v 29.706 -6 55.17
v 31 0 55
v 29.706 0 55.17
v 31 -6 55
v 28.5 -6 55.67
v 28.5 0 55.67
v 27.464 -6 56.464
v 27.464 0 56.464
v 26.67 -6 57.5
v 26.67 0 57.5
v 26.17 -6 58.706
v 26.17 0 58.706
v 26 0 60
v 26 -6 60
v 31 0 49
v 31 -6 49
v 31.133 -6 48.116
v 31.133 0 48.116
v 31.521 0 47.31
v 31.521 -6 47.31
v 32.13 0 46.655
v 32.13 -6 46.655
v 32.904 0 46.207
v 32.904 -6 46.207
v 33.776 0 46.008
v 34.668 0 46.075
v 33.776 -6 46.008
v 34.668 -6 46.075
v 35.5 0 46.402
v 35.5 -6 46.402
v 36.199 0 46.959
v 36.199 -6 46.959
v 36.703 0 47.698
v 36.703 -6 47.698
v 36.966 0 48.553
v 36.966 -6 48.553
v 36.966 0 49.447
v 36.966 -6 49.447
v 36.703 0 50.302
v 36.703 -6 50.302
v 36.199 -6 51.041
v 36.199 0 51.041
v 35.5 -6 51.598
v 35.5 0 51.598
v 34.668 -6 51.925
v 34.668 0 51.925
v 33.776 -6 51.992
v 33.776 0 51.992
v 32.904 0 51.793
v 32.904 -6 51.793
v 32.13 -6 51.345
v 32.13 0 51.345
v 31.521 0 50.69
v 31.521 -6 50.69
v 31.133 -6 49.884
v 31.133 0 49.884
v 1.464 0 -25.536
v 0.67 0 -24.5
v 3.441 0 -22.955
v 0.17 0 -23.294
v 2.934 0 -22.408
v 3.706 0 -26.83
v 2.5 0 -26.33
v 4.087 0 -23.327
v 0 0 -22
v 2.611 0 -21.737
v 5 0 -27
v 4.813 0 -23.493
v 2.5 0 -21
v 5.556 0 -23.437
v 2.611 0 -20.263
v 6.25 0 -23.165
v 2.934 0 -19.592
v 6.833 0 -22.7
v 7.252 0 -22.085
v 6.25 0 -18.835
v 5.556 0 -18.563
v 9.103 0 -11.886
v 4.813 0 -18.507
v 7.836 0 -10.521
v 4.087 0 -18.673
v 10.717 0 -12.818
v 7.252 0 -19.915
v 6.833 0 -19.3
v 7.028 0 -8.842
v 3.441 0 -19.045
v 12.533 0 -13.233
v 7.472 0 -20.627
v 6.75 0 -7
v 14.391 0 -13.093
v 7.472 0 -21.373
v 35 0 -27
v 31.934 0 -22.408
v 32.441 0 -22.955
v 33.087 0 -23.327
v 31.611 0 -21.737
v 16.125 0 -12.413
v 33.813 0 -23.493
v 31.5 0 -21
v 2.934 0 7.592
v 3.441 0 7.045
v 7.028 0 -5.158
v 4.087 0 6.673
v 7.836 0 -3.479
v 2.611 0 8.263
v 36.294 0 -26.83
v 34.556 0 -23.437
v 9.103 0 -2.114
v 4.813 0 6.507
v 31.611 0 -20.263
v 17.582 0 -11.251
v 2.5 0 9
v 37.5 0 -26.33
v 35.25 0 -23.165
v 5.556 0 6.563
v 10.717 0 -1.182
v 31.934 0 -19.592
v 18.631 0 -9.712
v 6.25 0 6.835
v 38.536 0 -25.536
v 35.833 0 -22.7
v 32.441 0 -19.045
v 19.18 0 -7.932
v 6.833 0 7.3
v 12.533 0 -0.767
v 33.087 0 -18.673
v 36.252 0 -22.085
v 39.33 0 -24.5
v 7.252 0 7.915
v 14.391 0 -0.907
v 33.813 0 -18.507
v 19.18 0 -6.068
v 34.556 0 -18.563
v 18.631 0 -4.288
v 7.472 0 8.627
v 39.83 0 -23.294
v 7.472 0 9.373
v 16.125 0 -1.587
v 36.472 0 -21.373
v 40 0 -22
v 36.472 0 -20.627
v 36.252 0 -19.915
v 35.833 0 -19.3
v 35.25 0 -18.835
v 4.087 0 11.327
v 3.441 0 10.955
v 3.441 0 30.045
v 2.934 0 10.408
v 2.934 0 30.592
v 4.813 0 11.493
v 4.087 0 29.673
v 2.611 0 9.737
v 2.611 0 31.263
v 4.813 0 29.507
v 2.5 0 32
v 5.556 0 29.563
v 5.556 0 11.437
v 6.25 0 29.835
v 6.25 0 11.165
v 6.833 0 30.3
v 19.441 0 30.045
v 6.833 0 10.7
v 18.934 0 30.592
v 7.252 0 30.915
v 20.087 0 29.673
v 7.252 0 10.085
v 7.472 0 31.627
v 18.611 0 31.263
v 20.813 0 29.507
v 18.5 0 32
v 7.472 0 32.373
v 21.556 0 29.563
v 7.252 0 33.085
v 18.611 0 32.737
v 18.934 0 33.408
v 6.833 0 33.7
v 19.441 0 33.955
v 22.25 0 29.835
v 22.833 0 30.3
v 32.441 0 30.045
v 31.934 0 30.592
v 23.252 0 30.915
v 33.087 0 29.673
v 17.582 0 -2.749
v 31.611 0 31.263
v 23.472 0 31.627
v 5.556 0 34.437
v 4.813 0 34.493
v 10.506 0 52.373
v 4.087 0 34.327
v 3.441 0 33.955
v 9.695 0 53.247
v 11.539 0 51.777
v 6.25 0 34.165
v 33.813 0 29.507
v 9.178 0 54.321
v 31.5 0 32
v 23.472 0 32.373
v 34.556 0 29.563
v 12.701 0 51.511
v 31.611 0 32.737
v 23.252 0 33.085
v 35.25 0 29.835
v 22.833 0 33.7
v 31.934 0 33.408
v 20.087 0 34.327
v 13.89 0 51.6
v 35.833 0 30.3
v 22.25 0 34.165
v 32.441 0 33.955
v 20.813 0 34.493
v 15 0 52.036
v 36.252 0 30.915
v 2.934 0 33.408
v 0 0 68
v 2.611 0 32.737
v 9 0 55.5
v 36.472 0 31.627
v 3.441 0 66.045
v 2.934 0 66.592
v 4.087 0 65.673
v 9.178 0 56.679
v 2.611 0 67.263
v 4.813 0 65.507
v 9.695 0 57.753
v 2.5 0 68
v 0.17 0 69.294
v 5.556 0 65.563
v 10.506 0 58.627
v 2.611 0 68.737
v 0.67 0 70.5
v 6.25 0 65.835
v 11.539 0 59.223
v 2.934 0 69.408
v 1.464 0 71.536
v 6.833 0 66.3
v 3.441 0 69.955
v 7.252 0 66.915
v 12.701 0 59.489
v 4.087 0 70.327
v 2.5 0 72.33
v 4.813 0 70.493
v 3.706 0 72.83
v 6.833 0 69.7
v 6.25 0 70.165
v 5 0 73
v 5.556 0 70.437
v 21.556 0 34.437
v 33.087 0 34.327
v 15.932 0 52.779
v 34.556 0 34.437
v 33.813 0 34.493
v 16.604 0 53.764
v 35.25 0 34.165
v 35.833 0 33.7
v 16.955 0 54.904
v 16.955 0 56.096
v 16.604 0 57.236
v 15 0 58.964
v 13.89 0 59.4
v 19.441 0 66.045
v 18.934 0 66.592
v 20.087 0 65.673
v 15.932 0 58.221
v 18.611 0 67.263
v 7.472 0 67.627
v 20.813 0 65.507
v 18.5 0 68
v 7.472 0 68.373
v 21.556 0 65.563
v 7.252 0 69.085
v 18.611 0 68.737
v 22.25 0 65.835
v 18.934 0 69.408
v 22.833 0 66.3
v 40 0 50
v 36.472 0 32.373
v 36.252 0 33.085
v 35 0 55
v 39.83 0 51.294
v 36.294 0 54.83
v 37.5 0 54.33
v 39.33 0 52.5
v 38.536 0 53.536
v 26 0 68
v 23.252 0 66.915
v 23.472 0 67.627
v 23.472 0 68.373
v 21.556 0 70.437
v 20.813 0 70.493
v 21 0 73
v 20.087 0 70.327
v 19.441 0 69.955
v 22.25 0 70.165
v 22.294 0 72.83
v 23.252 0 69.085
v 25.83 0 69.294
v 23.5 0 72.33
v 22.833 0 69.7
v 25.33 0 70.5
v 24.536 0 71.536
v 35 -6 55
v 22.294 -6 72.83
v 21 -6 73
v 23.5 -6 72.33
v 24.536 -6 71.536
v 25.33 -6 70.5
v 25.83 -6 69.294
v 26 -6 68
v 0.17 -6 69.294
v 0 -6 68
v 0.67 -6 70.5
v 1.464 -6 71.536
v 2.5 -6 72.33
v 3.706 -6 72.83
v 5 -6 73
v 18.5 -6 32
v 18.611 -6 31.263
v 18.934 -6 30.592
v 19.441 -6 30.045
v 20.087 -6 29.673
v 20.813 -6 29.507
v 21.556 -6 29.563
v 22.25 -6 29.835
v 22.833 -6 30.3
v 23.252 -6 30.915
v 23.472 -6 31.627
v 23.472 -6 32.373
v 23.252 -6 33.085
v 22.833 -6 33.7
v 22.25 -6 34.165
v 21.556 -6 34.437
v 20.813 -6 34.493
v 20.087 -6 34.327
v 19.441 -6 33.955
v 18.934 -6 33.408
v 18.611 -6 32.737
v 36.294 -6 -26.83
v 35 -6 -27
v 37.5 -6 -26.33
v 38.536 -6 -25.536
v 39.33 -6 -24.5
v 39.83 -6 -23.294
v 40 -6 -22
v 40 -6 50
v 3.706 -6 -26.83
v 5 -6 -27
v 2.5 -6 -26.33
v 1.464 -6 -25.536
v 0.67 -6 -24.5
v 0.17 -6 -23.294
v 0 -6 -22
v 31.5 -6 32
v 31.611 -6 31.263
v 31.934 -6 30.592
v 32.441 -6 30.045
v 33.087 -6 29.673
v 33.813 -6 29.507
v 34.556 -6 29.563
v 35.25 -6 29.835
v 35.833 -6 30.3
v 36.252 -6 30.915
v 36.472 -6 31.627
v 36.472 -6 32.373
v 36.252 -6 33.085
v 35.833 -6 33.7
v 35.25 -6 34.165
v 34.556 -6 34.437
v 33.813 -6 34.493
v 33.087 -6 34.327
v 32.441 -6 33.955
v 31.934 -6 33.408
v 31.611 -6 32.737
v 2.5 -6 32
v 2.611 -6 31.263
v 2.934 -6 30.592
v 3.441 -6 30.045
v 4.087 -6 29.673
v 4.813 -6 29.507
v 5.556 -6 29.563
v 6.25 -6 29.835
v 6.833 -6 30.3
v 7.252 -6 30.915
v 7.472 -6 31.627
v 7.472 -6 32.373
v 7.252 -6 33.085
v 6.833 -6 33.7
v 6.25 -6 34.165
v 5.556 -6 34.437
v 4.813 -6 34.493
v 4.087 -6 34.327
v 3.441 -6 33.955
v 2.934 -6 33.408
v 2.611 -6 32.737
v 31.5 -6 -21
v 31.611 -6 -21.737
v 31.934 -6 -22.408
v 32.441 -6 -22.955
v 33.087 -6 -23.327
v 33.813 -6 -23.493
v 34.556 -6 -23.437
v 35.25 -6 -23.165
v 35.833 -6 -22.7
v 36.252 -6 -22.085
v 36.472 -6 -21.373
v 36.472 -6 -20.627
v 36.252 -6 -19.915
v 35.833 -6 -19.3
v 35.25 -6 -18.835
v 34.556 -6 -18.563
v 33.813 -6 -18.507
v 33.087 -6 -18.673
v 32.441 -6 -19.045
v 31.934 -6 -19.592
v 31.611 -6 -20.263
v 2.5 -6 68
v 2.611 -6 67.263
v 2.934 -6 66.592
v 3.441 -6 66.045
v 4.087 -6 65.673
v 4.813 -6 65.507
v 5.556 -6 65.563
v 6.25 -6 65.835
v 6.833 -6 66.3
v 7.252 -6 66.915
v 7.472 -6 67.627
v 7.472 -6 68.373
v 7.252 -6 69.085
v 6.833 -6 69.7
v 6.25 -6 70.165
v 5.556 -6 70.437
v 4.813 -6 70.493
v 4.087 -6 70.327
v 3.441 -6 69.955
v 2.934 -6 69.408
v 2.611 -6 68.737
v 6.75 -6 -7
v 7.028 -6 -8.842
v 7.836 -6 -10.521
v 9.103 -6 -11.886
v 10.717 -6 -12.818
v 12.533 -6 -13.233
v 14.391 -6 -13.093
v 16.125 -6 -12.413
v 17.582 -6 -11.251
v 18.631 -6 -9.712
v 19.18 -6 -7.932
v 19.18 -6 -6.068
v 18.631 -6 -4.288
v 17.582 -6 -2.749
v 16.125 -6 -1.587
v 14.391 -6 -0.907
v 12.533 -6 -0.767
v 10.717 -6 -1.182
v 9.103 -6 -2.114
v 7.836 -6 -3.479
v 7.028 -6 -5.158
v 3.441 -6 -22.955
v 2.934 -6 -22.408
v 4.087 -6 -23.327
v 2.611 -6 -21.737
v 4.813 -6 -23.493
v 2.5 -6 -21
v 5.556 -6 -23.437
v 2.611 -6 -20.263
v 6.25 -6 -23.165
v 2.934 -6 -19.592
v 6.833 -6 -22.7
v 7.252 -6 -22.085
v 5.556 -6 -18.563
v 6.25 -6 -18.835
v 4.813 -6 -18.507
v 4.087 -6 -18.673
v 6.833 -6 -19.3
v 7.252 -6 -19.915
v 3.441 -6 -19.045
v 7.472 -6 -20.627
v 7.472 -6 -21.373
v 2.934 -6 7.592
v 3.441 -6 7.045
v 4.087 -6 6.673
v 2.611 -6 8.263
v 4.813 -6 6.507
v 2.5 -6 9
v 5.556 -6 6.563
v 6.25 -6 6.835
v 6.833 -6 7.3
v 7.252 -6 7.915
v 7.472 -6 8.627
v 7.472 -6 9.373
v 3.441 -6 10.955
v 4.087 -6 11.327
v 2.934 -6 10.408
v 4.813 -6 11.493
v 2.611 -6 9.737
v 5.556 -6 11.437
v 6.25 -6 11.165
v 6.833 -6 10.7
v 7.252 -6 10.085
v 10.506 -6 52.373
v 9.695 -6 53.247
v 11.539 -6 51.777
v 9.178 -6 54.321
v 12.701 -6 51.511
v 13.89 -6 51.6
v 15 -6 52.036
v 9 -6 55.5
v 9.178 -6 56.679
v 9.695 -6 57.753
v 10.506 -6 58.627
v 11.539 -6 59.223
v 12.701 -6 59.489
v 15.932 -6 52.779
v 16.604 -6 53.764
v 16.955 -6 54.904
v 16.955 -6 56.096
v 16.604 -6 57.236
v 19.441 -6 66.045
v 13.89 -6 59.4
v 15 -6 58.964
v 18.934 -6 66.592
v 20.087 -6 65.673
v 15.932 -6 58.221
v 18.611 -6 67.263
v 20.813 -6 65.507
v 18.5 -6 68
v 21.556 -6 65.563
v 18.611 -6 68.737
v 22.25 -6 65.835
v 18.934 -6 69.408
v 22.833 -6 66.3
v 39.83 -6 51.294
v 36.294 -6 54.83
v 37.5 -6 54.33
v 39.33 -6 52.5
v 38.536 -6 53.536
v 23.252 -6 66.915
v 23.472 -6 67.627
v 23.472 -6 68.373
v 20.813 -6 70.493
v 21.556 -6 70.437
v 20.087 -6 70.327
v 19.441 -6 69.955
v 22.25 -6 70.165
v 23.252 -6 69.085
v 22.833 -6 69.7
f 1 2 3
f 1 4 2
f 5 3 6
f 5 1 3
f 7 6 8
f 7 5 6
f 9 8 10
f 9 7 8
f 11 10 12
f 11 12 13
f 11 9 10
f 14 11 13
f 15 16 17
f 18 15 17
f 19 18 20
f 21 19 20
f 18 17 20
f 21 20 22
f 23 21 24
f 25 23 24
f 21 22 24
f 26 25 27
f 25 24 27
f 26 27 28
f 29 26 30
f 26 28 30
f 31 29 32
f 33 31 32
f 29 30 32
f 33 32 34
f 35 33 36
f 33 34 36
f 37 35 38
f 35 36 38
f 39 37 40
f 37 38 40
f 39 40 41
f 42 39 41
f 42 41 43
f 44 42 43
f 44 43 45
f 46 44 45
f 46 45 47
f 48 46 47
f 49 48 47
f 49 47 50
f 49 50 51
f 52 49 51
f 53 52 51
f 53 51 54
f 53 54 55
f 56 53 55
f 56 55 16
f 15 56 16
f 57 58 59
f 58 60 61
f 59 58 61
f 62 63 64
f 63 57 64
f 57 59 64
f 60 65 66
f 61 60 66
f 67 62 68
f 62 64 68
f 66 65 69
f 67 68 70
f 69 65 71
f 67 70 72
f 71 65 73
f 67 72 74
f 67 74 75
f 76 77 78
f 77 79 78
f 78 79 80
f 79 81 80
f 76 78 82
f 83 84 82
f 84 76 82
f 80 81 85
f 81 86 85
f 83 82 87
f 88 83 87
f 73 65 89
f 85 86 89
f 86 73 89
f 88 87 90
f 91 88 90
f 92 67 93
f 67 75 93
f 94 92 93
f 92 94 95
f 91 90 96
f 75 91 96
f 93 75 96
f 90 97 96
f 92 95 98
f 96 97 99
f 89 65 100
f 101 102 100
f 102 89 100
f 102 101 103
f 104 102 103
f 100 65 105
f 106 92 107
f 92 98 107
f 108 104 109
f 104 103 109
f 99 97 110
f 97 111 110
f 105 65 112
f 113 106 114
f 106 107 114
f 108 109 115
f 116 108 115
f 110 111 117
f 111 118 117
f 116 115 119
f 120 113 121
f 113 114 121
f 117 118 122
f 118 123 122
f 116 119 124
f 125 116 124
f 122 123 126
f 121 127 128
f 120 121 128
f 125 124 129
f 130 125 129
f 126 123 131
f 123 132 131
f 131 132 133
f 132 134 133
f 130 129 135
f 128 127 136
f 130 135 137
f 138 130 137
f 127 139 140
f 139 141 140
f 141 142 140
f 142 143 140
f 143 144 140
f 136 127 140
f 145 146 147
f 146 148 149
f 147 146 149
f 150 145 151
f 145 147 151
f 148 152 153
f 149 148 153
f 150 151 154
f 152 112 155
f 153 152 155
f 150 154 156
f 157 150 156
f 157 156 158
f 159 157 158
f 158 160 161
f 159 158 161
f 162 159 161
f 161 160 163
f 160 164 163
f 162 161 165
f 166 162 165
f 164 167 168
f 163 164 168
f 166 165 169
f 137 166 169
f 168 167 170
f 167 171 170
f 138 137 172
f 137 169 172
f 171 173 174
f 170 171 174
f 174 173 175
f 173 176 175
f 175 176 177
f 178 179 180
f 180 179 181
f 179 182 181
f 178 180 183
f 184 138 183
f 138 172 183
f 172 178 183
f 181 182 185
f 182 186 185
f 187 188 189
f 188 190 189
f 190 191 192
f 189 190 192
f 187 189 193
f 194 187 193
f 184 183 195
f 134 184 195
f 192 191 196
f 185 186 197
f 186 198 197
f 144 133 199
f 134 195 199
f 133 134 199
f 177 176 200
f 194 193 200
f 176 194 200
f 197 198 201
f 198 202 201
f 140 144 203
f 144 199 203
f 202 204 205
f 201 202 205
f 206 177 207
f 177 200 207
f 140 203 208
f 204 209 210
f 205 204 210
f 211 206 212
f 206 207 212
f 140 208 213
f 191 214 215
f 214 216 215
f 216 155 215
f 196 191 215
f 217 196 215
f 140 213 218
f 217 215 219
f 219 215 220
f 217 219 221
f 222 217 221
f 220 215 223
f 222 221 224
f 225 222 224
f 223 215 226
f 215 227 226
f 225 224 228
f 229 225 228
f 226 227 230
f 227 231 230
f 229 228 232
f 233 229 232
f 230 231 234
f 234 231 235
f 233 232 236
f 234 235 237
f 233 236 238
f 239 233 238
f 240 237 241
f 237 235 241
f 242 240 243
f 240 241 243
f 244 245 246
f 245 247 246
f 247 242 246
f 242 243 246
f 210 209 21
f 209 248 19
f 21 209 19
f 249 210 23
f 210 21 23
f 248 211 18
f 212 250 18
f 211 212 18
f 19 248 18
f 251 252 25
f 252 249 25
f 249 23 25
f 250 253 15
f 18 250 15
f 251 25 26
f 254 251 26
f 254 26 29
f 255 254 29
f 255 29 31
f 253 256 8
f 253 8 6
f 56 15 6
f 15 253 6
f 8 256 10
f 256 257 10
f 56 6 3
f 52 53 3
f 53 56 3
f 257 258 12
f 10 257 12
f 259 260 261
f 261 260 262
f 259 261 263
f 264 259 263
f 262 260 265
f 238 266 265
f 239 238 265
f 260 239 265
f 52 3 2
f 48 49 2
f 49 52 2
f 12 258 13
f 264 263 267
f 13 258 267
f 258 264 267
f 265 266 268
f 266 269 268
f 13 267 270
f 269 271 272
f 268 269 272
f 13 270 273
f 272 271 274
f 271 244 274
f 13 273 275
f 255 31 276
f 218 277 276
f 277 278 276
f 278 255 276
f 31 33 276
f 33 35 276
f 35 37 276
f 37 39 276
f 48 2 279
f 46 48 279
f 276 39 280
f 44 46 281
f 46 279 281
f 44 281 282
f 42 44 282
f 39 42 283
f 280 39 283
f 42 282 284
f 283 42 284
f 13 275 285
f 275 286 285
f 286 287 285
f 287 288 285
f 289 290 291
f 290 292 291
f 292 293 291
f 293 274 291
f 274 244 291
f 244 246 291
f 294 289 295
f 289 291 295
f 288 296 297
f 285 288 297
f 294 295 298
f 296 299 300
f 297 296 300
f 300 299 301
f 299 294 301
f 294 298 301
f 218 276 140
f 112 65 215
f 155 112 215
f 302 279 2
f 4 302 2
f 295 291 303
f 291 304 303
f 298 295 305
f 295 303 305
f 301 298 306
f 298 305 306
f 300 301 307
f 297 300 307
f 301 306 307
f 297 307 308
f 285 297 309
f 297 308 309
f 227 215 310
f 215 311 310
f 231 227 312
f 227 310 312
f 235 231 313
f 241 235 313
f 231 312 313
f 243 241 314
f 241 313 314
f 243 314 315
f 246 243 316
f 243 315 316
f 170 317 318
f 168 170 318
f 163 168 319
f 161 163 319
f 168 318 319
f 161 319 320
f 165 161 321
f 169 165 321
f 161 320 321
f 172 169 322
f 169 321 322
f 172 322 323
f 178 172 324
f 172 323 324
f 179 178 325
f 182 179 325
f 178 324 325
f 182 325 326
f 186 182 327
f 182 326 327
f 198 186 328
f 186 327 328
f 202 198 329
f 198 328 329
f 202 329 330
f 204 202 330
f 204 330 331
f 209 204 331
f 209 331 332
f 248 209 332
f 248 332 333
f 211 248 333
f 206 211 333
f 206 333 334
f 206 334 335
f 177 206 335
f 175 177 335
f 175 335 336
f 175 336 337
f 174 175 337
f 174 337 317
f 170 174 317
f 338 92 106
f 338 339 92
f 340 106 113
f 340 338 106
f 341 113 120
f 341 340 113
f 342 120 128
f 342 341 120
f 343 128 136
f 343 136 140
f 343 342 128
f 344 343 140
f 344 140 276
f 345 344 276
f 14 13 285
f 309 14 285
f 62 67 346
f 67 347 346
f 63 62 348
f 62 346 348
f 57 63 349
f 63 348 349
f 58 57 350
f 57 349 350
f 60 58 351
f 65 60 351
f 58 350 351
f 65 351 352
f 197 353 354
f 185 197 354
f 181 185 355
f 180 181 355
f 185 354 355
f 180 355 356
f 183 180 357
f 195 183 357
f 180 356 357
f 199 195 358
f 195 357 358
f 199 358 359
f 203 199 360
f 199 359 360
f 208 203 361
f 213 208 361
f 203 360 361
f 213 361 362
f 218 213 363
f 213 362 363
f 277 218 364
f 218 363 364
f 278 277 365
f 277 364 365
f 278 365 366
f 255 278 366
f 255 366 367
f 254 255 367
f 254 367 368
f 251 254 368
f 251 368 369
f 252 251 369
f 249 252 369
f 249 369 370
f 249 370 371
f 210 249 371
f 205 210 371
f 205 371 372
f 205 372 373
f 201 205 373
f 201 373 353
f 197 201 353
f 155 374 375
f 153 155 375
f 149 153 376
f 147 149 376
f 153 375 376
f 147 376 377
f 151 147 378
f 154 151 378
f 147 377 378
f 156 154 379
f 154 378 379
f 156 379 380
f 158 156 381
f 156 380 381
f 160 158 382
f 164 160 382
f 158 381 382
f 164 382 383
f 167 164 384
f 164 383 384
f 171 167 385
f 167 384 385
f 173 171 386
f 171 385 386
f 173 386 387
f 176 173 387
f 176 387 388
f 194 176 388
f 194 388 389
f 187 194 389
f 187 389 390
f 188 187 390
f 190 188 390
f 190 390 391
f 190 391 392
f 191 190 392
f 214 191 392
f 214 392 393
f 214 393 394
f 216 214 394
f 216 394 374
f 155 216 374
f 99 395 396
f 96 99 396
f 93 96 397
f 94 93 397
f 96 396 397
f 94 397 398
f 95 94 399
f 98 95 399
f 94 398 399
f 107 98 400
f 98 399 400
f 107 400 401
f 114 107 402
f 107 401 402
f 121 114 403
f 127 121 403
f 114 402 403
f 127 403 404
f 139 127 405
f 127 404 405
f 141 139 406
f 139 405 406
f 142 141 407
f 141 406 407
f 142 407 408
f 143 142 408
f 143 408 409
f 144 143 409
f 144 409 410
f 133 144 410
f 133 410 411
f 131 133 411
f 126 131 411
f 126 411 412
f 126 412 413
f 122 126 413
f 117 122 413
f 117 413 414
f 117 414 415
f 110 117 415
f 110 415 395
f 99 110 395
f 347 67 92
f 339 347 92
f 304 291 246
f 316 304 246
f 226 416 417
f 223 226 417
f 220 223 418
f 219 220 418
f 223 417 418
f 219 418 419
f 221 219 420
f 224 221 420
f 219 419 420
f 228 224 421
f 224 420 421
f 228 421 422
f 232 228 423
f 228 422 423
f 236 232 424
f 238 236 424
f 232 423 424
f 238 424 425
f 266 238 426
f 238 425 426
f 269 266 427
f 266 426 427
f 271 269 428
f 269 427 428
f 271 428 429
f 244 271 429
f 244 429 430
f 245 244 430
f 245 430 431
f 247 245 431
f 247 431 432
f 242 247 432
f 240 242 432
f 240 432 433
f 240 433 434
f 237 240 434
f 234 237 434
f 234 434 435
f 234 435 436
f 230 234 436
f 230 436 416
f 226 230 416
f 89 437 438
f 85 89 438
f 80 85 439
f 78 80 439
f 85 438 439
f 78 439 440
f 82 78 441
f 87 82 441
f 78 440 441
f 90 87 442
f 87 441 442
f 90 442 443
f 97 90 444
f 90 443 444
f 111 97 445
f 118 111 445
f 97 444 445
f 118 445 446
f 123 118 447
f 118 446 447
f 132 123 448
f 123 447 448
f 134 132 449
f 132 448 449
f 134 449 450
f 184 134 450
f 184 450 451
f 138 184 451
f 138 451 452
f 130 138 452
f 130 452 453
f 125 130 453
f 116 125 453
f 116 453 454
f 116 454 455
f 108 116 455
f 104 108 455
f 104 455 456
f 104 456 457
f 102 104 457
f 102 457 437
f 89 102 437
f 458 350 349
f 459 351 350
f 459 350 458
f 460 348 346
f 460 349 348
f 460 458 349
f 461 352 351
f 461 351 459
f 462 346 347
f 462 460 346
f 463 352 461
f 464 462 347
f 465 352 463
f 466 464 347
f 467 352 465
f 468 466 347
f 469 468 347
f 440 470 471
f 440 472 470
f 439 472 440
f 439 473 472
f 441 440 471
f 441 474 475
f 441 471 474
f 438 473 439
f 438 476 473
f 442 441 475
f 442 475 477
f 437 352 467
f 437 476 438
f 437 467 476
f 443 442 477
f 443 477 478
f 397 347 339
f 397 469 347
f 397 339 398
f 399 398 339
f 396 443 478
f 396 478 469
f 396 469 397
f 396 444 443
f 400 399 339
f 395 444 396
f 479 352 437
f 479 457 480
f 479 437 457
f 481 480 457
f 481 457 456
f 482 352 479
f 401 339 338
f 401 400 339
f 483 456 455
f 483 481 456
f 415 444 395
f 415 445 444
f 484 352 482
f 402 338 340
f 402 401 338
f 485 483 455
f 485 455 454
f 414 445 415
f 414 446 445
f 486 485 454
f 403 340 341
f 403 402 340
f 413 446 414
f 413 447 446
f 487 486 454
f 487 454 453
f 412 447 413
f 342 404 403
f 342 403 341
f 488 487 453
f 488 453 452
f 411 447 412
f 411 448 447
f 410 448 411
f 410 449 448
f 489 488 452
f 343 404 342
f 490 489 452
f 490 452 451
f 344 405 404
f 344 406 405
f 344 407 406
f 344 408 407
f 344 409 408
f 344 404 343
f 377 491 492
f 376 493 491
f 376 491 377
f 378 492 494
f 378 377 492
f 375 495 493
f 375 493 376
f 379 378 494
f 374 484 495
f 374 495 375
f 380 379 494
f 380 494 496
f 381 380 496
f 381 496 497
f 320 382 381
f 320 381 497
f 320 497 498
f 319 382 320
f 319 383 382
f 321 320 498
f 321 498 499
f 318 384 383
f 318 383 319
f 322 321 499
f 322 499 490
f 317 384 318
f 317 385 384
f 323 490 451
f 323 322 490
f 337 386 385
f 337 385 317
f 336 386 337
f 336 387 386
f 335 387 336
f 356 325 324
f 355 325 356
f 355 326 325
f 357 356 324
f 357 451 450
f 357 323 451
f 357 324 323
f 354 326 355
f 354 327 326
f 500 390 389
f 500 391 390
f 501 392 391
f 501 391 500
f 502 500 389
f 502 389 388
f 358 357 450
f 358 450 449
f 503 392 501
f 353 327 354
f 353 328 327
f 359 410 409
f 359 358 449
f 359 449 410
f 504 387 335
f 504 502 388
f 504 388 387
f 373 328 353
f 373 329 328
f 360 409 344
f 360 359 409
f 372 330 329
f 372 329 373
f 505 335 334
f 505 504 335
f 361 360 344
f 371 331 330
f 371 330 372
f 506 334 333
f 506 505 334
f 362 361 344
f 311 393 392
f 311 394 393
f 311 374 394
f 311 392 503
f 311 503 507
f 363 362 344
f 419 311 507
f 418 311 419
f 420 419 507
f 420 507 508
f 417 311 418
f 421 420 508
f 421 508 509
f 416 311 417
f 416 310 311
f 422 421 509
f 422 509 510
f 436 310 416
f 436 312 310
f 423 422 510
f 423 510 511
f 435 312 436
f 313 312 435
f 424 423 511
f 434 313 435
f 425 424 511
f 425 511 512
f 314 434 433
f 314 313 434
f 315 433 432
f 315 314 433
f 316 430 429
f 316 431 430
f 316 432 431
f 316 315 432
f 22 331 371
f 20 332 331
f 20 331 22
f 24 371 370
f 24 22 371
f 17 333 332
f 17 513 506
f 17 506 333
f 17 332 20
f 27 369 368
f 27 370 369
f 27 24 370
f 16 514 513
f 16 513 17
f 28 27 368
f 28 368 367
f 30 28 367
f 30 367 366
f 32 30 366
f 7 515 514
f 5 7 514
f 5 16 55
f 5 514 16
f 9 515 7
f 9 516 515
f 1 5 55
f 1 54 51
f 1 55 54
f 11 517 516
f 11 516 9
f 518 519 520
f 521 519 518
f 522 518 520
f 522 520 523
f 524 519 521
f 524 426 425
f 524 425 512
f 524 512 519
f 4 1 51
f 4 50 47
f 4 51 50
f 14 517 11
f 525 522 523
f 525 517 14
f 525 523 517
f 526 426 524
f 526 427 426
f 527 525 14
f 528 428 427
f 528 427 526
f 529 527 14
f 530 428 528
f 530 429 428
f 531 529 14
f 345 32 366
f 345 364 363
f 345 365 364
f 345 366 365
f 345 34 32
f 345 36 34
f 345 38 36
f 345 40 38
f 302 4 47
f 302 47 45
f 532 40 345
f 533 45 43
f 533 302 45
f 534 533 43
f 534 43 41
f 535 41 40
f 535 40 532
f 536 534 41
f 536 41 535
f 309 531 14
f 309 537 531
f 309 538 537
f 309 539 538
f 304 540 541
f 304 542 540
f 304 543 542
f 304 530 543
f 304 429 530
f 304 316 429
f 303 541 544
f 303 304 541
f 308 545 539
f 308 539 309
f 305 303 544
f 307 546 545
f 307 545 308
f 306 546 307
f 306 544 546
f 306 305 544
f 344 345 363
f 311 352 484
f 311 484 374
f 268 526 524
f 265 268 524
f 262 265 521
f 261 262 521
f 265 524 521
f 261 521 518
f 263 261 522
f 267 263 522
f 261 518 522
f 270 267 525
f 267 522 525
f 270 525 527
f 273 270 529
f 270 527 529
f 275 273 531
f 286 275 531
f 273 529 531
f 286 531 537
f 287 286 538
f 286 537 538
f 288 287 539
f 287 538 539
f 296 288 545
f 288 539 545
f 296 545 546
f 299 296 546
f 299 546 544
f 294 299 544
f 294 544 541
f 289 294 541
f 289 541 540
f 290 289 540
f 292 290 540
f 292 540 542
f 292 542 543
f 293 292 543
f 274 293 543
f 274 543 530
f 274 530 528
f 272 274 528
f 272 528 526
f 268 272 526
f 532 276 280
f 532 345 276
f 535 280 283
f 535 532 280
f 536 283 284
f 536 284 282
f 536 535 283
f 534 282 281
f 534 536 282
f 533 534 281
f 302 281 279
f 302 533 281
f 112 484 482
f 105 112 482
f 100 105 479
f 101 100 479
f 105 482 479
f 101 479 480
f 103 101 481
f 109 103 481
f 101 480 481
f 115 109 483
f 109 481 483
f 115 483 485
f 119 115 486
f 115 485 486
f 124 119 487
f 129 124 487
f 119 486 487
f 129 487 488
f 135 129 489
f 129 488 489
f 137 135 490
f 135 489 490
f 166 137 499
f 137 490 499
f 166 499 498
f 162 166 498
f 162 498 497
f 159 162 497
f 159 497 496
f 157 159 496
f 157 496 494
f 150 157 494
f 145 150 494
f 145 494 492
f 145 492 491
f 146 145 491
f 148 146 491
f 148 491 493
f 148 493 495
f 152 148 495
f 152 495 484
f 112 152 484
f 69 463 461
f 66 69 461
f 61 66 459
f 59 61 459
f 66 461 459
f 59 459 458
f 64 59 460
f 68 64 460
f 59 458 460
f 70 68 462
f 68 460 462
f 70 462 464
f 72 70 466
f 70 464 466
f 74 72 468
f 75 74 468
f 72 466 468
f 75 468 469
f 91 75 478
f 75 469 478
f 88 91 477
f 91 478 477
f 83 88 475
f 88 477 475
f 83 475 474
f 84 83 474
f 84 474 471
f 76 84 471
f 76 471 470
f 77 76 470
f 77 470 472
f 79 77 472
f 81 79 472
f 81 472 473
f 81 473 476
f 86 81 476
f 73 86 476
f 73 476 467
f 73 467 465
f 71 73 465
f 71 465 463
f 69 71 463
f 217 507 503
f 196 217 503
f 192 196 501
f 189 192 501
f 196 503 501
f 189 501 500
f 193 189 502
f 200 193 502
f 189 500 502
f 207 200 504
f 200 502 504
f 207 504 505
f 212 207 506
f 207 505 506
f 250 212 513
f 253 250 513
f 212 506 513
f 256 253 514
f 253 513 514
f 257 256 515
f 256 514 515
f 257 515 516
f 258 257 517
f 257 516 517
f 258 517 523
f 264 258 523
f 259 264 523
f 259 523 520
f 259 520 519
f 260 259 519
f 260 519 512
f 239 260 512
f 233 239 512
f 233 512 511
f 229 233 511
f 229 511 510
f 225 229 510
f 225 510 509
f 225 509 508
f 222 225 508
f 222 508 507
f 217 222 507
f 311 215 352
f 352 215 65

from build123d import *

# Parameters (mm, degrees)
F1_DEPTH = 6
F2_D     = 12.5
F3_D     = 5
F4_D     = 5
F5_D     = 5
F6_D     = 5
F7_R     = 5
F8_D     = 8
F8_DEPTH = 20
F8_TIP   = 2.4034424761
F9_D     = 6


with BuildPart() as f1:
    # F0 (on Front) → F1 (new body)
    with BuildSketch(Plane.XZ):
        Polygon((0, 27), (0, -27), (13, -27), (40, -27), (40, 55), (26, 55), (26, 73), (0, 73), align=None)
    extrude(amount=F1_DEPTH)

    # F2 (through all)
    with Locations(Plane(origin=(0, 0, 0), x_dir=(1, 0, 0), z_dir=(0, 1, 0))):
        with Locations((13, 7)):
            Hole(F2_D / 2)

    # F3 (through all)
    with Locations(Plane(origin=(0, 0, 0), x_dir=(1, 0, 0), z_dir=(0, 1, 0))):
        with Locations((34, 21), (34, -32)):
            Hole(F3_D / 2)

    # F4 (through all)
    with Locations(Plane(origin=(0, 0, 0), x_dir=(1, 0, 0), z_dir=(0, 1, 0))):
        with Locations((5, -32), (21, -32)):
            Hole(F4_D / 2)

    # F5 (through all)
    with Locations(Plane(origin=(0, 0, 0), x_dir=(1, 0, 0), z_dir=(0, 1, 0))):
        with Locations((5, 21), (5, -9)):
            Hole(F5_D / 2)

    # F6 (through all)
    with Locations(Plane(origin=(0, 0, 0), x_dir=(1, 0, 0), z_dir=(0, 1, 0))):
        with Locations((5, -68), (21, -68)):
            Hole(F6_D / 2)

    # F7
    f7_edges = [f1.edges().sort_by_distance(p)[0] for p in [
        (26, -3, 73),
        (0, -3, 73),
        (40, -3, 55),
        (26, -3, 55),
        (40, -3, -27),
        (0, -3, -27),
    ]]
    fillet(f7_edges, radius=F7_R)

    # F8
    with Locations(Plane(origin=(0, 0, 0), x_dir=(1, 0, 0), z_dir=(0, 1, 0))):
        with Locations((13, -55.5)):
            Hole(F8_D / 2, depth=F8_DEPTH)
            with Locations((0, 0, -(F8_DEPTH + F8_TIP / 2))):  # 118° drill point
                Cone(0, F8_D / 2, F8_TIP, mode=Mode.SUBTRACT)

    # F9 (through all)
    with Locations(Plane(origin=(0, 0, 0), x_dir=(1, 0, 0), z_dir=(0, 1, 0))):
        with Locations((34, -49)):
            Hole(F9_D / 2)


solid = f1.part
